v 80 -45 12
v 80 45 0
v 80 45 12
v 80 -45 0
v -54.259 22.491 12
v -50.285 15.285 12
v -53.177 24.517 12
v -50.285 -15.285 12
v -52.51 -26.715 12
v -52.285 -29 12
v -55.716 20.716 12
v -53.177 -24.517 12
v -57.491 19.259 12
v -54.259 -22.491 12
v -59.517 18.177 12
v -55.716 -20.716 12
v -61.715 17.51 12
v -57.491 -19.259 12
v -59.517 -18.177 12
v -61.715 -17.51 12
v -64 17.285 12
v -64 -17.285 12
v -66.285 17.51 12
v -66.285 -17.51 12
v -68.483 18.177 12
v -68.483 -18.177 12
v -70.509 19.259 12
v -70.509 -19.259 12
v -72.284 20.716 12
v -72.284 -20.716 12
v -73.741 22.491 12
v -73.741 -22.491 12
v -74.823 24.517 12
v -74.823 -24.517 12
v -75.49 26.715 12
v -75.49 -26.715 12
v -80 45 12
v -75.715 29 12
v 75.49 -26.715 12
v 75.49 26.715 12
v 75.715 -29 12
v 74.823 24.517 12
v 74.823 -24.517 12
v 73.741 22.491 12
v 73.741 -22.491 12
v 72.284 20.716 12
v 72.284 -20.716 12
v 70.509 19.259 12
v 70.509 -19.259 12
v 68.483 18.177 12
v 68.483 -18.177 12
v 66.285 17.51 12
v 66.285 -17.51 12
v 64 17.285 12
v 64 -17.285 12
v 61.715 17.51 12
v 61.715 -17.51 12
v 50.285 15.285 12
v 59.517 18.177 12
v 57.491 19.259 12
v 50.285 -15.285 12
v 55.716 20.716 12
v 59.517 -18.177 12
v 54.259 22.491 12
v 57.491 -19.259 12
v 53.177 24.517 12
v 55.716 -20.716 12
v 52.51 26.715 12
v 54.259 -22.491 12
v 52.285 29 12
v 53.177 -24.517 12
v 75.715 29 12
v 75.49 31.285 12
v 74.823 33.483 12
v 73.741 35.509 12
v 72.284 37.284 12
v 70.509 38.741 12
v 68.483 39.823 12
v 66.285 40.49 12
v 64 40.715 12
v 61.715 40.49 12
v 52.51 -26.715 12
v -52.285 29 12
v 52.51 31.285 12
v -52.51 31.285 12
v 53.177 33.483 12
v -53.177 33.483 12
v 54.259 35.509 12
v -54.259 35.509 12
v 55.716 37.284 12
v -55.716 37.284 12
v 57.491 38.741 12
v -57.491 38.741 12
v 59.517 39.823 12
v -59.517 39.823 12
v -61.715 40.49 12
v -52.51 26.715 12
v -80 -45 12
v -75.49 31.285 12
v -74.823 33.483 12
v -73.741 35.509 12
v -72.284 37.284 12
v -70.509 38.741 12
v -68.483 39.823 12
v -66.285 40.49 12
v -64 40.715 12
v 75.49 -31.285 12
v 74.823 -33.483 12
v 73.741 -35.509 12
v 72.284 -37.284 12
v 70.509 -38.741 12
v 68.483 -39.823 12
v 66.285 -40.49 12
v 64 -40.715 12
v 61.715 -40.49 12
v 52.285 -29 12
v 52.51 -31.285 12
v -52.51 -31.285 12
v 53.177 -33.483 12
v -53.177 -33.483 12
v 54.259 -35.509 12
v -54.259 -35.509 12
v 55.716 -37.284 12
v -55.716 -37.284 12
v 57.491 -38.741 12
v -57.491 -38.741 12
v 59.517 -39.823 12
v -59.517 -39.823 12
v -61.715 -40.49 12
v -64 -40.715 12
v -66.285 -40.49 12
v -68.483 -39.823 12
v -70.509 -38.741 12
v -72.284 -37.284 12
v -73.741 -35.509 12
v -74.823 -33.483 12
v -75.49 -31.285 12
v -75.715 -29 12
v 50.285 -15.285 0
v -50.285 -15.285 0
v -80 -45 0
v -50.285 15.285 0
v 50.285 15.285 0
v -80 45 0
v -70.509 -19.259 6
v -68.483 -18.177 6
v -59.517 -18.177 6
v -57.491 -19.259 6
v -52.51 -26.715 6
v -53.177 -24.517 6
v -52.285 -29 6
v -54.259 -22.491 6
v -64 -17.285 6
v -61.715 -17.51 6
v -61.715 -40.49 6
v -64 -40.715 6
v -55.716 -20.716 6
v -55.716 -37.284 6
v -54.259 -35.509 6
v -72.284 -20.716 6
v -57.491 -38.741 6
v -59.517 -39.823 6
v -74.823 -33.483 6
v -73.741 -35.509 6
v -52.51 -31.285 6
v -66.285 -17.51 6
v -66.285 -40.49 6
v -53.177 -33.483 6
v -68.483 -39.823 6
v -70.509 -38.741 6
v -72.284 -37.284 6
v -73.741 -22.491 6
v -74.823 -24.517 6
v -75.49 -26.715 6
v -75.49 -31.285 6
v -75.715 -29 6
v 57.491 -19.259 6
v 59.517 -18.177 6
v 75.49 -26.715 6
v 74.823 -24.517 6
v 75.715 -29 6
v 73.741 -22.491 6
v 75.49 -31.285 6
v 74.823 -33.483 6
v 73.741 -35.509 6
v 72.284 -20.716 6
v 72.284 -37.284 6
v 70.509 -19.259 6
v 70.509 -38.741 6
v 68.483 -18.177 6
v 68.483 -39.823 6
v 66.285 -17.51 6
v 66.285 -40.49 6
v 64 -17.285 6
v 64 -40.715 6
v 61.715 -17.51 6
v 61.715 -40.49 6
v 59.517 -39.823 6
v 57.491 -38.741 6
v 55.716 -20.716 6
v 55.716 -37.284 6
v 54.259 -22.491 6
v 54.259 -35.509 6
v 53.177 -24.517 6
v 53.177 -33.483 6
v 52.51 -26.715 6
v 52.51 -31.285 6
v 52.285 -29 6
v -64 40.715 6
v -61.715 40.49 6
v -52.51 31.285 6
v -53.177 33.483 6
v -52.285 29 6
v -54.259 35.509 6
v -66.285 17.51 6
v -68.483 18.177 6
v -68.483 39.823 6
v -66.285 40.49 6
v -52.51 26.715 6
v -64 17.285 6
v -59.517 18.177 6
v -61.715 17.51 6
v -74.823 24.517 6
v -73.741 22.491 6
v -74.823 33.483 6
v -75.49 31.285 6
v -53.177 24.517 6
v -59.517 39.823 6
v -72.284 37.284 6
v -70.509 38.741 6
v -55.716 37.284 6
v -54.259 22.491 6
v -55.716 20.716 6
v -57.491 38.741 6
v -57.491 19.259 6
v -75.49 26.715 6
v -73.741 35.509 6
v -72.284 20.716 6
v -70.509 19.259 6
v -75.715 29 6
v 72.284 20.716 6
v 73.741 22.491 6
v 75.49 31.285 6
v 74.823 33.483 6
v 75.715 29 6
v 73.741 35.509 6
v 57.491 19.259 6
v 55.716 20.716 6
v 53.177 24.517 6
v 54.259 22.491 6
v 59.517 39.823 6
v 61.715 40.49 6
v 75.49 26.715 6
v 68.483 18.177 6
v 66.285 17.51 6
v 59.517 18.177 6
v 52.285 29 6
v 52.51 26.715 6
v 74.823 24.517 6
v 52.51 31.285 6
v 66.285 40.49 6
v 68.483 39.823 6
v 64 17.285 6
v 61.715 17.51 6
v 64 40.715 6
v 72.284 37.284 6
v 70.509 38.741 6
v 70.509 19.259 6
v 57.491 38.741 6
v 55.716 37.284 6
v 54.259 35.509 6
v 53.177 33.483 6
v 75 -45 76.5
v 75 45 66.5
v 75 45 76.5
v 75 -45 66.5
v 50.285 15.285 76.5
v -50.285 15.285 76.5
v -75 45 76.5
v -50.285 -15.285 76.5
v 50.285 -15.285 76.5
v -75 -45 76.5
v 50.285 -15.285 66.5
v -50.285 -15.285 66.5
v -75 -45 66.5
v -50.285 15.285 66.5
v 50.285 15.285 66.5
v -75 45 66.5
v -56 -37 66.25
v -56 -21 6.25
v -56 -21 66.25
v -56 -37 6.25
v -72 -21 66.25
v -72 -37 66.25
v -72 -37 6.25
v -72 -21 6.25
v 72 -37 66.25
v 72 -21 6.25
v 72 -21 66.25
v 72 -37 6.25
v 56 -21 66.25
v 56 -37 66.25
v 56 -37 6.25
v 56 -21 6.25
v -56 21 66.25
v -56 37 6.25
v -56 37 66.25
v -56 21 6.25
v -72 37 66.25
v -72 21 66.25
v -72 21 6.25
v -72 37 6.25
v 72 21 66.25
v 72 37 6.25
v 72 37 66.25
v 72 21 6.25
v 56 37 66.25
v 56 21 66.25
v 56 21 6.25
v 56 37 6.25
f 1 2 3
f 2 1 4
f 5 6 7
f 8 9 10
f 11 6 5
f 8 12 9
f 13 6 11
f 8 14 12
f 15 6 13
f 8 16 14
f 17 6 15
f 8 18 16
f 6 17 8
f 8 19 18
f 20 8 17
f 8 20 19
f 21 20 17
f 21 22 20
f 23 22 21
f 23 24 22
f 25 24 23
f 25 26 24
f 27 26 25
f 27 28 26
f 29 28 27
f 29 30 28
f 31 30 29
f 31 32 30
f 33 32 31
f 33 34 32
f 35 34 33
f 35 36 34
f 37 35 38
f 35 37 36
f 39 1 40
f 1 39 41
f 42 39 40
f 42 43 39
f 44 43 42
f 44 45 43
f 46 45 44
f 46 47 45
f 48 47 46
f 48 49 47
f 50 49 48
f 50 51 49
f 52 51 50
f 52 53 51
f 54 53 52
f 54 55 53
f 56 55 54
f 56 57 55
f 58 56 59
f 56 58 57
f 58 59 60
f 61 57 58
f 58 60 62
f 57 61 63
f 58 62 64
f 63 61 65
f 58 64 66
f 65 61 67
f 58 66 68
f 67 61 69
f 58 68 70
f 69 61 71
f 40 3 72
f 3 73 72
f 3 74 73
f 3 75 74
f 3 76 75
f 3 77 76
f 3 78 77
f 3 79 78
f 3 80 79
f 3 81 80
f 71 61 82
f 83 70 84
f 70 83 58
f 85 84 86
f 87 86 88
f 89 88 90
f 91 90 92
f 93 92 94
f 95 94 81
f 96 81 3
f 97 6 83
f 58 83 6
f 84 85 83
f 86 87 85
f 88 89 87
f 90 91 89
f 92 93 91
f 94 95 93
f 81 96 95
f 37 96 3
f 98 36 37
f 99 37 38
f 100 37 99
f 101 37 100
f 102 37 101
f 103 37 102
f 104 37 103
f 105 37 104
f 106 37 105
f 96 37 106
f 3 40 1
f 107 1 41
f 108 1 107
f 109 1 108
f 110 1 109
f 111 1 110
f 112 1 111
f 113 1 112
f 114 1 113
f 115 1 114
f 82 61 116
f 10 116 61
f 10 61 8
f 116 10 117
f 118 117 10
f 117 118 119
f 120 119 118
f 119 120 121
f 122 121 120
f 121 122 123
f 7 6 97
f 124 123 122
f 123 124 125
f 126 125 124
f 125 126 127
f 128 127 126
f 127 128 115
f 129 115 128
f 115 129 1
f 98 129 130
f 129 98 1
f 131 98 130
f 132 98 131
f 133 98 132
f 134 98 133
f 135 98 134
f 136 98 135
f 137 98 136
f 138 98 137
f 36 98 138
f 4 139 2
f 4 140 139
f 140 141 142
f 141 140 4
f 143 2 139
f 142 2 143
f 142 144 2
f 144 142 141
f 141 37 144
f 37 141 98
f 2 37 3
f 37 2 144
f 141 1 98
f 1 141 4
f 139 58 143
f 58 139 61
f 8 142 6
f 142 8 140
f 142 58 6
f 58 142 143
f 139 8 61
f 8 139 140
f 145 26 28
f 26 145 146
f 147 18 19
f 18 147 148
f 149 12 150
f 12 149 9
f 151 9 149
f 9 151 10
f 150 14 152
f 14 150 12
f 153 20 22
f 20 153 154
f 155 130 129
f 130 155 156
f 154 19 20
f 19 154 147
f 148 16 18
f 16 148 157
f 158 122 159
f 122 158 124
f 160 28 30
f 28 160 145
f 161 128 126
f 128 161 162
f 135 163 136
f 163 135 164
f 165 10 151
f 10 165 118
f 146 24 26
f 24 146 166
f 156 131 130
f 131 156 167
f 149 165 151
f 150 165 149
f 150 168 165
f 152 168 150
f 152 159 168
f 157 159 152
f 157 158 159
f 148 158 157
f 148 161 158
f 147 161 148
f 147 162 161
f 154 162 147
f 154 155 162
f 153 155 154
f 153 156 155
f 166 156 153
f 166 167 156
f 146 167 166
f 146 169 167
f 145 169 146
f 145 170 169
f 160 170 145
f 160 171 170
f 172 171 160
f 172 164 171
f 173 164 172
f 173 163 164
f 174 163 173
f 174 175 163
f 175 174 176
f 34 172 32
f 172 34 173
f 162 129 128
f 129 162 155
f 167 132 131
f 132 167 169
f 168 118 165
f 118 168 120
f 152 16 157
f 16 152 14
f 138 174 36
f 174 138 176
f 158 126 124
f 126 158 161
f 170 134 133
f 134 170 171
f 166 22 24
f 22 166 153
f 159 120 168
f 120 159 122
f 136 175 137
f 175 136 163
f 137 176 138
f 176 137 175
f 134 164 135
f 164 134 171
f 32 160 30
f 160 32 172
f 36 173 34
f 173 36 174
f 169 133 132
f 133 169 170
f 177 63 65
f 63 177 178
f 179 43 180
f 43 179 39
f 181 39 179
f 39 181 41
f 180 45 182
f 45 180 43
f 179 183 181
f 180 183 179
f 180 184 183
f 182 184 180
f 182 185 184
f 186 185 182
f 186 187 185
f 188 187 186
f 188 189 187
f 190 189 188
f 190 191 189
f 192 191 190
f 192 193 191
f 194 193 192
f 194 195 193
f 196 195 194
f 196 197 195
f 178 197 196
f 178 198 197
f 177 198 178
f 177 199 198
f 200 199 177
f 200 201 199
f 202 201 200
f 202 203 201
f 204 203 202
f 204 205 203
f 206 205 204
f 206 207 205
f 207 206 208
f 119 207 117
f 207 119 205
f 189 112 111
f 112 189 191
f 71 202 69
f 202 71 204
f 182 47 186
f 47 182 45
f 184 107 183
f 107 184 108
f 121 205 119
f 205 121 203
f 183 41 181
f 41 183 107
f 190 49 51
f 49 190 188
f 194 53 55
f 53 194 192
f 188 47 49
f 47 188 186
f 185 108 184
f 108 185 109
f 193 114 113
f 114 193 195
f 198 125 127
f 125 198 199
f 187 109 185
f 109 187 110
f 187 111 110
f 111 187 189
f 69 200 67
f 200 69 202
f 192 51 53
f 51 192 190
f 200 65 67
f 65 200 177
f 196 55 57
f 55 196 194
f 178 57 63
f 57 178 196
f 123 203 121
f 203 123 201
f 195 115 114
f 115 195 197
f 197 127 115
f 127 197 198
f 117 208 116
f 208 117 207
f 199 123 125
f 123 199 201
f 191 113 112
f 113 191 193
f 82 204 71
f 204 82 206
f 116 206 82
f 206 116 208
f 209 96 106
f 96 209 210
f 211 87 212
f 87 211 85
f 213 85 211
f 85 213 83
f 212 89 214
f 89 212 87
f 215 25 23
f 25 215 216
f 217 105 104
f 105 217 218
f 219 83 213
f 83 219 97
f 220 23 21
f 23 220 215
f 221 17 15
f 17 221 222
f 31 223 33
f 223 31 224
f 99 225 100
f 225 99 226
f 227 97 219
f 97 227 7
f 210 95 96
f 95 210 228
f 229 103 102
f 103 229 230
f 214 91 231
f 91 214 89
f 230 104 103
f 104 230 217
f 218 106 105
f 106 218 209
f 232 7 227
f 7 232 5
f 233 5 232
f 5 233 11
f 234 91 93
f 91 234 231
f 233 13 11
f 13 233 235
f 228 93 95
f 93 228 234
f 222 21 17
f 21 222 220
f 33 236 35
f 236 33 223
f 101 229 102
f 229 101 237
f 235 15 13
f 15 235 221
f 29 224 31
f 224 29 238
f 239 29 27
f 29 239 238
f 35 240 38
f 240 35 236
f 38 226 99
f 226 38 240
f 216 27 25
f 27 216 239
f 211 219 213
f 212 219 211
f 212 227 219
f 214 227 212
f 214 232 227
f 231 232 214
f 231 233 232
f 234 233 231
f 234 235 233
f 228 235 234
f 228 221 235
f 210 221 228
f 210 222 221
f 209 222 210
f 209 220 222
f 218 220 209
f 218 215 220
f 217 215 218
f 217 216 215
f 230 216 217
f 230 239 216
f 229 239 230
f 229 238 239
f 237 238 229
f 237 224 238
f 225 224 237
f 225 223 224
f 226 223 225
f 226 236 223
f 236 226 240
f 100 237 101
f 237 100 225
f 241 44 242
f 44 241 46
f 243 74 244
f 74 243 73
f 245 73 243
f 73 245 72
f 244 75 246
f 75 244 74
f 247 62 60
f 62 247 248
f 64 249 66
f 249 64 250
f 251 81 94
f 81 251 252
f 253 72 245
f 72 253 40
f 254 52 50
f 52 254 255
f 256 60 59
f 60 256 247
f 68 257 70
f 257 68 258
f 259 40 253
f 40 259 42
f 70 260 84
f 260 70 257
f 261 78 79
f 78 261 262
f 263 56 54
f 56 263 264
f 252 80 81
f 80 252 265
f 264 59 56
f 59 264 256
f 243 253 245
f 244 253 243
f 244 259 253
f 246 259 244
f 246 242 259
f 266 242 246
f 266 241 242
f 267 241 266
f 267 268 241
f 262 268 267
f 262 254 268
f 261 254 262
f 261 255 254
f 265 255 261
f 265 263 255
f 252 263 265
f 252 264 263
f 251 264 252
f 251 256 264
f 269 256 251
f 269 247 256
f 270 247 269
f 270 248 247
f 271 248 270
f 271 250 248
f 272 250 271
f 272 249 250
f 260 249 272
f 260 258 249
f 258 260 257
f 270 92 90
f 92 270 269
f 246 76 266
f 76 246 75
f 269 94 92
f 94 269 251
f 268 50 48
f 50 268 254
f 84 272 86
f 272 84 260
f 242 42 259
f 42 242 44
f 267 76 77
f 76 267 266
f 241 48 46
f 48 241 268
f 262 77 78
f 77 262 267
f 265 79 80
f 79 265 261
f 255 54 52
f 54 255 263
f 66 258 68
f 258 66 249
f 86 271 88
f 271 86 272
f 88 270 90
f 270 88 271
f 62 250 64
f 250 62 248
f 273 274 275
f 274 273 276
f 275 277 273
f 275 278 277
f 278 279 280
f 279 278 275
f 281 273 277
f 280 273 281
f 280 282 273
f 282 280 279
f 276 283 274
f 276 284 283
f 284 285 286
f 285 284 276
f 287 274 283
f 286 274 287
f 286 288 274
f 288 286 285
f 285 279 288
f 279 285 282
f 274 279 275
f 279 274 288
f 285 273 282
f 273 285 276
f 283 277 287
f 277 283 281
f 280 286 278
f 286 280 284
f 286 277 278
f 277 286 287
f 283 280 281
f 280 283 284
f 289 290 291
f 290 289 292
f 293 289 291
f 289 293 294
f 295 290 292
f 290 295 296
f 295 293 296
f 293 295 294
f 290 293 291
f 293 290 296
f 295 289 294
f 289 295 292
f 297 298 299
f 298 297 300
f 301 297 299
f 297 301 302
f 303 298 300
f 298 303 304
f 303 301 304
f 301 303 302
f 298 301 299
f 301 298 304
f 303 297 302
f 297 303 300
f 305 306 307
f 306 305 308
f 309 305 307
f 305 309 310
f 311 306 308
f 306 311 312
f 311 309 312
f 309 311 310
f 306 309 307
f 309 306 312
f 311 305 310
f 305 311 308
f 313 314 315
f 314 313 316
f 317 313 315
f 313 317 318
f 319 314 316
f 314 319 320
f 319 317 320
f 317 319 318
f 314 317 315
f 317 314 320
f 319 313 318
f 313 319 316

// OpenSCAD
$fn = 32;

// ------------------------------------------------------------------------
// Frame cube: base 160 x 90 mm, posts 60 mm tall
// Every part is its own module, assembly() places every instance.
// ------------------------------------------------------------------------

// --- part 1 ---
module base_frame() {
  difference() {
    translate([-80, -45, 0]) cube([160, 90, 12]);
    translate([-50.285, -15.285, -1]) cube([100.57, 30.57, 14]);
    translate([-64, -29, 6]) cylinder(h = 7, d = 23.43);
    translate([64, -29, 6]) cylinder(h = 7, d = 23.43);
    translate([-64, 29, 6]) cylinder(h = 7, d = 23.43);
    translate([64, 29, 6]) cylinder(h = 7, d = 23.43);
  }
}

// --- part 2 ---
module corner_post() {
  translate([-8, -8, 0]) cube([16, 16, 60]);
}

// --- part 3 ---
module top_frame() {
  difference() {
    translate([-75, -45, 0]) cube([150, 90, 10]);
    translate([-50.285, -15.285, -1]) cube([100.57, 30.57, 12]);
  }
}

// --- assembly ---
module assembly() {
  color([0.80, 0.24, 0.20]) translate([0, 0, 0]) rotate([0, 0, 0]) base_frame();
  color([0.20, 0.45, 0.75]) translate([-64, -29, 6.25]) rotate([0, 0, 0]) corner_post();
  color([0.25, 0.62, 0.32]) translate([64, -29, 6.25]) rotate([0, 0, 0]) corner_post();
  color([0.92, 0.70, 0.18]) translate([-64, 29, 6.25]) rotate([0, 0, 0]) corner_post();
  color([0.58, 0.35, 0.70]) translate([64, 29, 6.25]) rotate([0, 0, 0]) corner_post();
  color([0.16, 0.66, 0.66]) translate([0, 0, 66.5]) rotate([0, 0, 0]) top_frame();
}

assembly();
